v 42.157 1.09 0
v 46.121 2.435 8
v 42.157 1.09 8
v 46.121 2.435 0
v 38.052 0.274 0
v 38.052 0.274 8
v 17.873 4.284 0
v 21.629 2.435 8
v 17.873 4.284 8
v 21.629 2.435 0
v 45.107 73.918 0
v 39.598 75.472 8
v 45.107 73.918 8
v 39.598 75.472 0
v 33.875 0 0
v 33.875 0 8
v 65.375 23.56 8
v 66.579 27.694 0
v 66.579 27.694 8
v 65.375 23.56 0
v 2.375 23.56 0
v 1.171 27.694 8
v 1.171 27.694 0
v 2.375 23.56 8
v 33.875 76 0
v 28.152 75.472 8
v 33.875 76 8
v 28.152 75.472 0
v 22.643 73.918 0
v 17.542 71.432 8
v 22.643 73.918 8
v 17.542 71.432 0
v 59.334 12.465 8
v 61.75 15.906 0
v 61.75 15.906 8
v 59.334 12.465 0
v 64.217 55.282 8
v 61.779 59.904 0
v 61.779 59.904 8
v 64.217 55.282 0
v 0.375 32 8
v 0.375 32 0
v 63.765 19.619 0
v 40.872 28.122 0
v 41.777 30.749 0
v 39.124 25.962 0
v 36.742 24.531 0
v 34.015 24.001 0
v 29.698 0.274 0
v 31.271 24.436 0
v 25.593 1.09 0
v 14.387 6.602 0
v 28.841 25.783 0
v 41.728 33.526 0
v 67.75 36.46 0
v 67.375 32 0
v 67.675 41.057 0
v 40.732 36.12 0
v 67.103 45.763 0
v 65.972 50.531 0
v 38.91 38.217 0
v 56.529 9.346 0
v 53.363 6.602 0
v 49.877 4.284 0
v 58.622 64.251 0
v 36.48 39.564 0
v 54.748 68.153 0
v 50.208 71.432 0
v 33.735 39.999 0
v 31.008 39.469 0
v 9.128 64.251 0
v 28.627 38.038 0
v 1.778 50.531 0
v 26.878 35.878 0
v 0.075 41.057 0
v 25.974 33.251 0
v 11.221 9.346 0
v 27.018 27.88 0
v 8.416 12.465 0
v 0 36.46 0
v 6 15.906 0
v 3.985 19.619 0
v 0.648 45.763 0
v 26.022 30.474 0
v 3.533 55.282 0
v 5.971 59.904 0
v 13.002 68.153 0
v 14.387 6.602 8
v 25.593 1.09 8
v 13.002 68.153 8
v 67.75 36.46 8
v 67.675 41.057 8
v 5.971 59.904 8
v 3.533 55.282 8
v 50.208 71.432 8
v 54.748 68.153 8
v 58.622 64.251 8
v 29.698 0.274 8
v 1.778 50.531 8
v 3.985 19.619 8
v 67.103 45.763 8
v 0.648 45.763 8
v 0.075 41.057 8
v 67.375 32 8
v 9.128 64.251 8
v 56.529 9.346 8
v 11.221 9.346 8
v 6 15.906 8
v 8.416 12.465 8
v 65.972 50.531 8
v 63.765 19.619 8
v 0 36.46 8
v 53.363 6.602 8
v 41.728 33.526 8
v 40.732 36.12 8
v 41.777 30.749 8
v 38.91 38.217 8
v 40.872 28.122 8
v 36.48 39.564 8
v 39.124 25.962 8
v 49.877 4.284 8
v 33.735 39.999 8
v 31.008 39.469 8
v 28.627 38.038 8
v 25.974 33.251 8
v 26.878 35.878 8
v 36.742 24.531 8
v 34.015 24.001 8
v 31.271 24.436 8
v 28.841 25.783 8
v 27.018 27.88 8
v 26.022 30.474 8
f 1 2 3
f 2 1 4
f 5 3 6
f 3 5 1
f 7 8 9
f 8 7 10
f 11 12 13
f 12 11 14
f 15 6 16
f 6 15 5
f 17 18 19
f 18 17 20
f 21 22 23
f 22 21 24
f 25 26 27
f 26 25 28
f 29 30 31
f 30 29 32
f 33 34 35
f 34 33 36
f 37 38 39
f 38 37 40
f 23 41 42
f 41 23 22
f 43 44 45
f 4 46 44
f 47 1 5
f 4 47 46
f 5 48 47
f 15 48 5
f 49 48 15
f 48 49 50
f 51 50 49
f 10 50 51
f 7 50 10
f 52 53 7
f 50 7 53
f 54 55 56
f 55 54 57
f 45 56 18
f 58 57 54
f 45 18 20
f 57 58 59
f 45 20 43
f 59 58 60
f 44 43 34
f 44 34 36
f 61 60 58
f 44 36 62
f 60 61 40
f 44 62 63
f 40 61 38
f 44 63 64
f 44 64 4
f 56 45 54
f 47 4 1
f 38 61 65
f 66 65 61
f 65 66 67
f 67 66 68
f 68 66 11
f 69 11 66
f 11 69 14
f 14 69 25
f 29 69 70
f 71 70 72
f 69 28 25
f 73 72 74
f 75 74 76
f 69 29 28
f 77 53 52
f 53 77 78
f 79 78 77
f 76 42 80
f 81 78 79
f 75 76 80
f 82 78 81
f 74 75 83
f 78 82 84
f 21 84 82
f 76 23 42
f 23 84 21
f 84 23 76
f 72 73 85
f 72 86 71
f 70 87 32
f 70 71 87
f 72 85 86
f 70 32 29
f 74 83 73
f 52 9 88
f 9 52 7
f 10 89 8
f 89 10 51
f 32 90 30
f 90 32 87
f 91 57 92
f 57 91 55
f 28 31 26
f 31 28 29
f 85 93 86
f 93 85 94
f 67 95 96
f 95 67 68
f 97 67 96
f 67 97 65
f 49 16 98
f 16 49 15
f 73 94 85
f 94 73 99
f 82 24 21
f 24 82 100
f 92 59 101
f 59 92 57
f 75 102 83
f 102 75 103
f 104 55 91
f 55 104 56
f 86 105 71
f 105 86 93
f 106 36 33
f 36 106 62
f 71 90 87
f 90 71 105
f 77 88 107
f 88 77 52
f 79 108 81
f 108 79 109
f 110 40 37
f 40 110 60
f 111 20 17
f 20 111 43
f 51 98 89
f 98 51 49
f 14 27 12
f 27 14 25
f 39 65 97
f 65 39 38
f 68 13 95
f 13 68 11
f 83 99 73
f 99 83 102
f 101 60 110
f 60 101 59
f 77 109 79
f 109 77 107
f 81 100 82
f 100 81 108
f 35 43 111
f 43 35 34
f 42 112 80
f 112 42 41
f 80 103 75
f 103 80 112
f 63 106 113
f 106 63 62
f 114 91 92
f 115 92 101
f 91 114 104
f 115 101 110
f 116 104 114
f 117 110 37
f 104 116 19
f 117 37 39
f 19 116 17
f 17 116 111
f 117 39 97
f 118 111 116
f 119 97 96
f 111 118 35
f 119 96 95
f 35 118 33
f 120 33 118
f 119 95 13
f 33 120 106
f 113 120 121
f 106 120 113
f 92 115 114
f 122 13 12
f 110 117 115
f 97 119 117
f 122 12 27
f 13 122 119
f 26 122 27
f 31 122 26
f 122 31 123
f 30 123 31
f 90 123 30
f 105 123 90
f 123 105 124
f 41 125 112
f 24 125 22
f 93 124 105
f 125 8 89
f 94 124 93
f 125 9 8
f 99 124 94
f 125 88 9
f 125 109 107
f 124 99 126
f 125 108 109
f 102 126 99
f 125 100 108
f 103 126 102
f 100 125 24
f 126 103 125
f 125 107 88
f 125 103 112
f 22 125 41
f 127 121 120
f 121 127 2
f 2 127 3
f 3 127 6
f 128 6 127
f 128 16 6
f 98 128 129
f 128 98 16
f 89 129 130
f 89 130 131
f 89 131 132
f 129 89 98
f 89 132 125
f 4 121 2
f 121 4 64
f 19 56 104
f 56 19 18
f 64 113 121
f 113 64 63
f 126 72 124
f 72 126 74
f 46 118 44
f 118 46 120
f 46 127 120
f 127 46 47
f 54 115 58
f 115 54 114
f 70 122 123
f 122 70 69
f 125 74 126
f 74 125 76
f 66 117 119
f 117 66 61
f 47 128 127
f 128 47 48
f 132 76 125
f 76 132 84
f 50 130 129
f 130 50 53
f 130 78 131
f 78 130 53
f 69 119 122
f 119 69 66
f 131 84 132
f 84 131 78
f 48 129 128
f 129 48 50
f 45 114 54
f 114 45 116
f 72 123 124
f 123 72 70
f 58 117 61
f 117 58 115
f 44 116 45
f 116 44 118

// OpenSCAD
$fn = 32;

// ----------------------------------------------------------------------
// Cam plate: single_lobe cam, base R32
// ----------------------------------------------------------------------

// --- parameters (mm) ---
base_r = 32;              // base circle radius
lobe_h = 12;              // cam lobe rise
bore_r = 8;               // shaft bore radius
plate_t = 8;              // plate thickness, Z (extrusion height)

profile = [[67.375, 32], [67.75, 36.46], [67.675, 41.057], [67.103, 45.763], [65.972, 50.531], [64.217, 55.282], [61.779, 59.904], [58.622, 64.251], [54.748, 68.153], [50.208, 71.432], [45.107, 73.918], [39.598, 75.472], [33.875, 76], [28.152, 75.472], [22.643, 73.918], [17.542, 71.432], [13.002, 68.153], [9.128, 64.251], [5.971, 59.904], [3.533, 55.282], [1.778, 50.531], [0.648, 45.763], [0.075, 41.057], [0, 36.46], [0.375, 32], [1.171, 27.694], [2.375, 23.56], [3.985, 19.619], [6, 15.906], [8.416, 12.465], [11.221, 9.346], [14.387, 6.602], [17.873, 4.284], [21.629, 2.435], [25.593, 1.09], [29.698, 0.274], [33.875, 0], [38.052, 0.274], [42.157, 1.09], [46.121, 2.435], [49.877, 4.284], [53.363, 6.602], [56.529, 9.346], [59.334, 12.465], [61.75, 15.906], [63.765, 19.619], [65.375, 23.56], [66.579, 27.694]];  // primary outline, 48 points, counter clockwise
void_1 = [[41.728, 33.526], [40.732, 36.12], [38.91, 38.217], [36.48, 39.564], [33.735, 39.999], [31.008, 39.469], [28.627, 38.038], [26.878, 35.878], [25.974, 33.251], [26.022, 30.474], [27.018, 27.88], [28.841, 25.783], [31.271, 24.436], [34.015, 24.001], [36.742, 24.531], [39.124, 25.962], [40.872, 28.122], [41.777, 30.749]];  // shaft bore, 18 points

// --- the one profile operation ---
difference() {
  linear_extrude(height = plate_t) polygon(points = profile);
  translate([0, 0, -1])
    linear_extrude(height = plate_t + 2) polygon(points = void_1);
}
